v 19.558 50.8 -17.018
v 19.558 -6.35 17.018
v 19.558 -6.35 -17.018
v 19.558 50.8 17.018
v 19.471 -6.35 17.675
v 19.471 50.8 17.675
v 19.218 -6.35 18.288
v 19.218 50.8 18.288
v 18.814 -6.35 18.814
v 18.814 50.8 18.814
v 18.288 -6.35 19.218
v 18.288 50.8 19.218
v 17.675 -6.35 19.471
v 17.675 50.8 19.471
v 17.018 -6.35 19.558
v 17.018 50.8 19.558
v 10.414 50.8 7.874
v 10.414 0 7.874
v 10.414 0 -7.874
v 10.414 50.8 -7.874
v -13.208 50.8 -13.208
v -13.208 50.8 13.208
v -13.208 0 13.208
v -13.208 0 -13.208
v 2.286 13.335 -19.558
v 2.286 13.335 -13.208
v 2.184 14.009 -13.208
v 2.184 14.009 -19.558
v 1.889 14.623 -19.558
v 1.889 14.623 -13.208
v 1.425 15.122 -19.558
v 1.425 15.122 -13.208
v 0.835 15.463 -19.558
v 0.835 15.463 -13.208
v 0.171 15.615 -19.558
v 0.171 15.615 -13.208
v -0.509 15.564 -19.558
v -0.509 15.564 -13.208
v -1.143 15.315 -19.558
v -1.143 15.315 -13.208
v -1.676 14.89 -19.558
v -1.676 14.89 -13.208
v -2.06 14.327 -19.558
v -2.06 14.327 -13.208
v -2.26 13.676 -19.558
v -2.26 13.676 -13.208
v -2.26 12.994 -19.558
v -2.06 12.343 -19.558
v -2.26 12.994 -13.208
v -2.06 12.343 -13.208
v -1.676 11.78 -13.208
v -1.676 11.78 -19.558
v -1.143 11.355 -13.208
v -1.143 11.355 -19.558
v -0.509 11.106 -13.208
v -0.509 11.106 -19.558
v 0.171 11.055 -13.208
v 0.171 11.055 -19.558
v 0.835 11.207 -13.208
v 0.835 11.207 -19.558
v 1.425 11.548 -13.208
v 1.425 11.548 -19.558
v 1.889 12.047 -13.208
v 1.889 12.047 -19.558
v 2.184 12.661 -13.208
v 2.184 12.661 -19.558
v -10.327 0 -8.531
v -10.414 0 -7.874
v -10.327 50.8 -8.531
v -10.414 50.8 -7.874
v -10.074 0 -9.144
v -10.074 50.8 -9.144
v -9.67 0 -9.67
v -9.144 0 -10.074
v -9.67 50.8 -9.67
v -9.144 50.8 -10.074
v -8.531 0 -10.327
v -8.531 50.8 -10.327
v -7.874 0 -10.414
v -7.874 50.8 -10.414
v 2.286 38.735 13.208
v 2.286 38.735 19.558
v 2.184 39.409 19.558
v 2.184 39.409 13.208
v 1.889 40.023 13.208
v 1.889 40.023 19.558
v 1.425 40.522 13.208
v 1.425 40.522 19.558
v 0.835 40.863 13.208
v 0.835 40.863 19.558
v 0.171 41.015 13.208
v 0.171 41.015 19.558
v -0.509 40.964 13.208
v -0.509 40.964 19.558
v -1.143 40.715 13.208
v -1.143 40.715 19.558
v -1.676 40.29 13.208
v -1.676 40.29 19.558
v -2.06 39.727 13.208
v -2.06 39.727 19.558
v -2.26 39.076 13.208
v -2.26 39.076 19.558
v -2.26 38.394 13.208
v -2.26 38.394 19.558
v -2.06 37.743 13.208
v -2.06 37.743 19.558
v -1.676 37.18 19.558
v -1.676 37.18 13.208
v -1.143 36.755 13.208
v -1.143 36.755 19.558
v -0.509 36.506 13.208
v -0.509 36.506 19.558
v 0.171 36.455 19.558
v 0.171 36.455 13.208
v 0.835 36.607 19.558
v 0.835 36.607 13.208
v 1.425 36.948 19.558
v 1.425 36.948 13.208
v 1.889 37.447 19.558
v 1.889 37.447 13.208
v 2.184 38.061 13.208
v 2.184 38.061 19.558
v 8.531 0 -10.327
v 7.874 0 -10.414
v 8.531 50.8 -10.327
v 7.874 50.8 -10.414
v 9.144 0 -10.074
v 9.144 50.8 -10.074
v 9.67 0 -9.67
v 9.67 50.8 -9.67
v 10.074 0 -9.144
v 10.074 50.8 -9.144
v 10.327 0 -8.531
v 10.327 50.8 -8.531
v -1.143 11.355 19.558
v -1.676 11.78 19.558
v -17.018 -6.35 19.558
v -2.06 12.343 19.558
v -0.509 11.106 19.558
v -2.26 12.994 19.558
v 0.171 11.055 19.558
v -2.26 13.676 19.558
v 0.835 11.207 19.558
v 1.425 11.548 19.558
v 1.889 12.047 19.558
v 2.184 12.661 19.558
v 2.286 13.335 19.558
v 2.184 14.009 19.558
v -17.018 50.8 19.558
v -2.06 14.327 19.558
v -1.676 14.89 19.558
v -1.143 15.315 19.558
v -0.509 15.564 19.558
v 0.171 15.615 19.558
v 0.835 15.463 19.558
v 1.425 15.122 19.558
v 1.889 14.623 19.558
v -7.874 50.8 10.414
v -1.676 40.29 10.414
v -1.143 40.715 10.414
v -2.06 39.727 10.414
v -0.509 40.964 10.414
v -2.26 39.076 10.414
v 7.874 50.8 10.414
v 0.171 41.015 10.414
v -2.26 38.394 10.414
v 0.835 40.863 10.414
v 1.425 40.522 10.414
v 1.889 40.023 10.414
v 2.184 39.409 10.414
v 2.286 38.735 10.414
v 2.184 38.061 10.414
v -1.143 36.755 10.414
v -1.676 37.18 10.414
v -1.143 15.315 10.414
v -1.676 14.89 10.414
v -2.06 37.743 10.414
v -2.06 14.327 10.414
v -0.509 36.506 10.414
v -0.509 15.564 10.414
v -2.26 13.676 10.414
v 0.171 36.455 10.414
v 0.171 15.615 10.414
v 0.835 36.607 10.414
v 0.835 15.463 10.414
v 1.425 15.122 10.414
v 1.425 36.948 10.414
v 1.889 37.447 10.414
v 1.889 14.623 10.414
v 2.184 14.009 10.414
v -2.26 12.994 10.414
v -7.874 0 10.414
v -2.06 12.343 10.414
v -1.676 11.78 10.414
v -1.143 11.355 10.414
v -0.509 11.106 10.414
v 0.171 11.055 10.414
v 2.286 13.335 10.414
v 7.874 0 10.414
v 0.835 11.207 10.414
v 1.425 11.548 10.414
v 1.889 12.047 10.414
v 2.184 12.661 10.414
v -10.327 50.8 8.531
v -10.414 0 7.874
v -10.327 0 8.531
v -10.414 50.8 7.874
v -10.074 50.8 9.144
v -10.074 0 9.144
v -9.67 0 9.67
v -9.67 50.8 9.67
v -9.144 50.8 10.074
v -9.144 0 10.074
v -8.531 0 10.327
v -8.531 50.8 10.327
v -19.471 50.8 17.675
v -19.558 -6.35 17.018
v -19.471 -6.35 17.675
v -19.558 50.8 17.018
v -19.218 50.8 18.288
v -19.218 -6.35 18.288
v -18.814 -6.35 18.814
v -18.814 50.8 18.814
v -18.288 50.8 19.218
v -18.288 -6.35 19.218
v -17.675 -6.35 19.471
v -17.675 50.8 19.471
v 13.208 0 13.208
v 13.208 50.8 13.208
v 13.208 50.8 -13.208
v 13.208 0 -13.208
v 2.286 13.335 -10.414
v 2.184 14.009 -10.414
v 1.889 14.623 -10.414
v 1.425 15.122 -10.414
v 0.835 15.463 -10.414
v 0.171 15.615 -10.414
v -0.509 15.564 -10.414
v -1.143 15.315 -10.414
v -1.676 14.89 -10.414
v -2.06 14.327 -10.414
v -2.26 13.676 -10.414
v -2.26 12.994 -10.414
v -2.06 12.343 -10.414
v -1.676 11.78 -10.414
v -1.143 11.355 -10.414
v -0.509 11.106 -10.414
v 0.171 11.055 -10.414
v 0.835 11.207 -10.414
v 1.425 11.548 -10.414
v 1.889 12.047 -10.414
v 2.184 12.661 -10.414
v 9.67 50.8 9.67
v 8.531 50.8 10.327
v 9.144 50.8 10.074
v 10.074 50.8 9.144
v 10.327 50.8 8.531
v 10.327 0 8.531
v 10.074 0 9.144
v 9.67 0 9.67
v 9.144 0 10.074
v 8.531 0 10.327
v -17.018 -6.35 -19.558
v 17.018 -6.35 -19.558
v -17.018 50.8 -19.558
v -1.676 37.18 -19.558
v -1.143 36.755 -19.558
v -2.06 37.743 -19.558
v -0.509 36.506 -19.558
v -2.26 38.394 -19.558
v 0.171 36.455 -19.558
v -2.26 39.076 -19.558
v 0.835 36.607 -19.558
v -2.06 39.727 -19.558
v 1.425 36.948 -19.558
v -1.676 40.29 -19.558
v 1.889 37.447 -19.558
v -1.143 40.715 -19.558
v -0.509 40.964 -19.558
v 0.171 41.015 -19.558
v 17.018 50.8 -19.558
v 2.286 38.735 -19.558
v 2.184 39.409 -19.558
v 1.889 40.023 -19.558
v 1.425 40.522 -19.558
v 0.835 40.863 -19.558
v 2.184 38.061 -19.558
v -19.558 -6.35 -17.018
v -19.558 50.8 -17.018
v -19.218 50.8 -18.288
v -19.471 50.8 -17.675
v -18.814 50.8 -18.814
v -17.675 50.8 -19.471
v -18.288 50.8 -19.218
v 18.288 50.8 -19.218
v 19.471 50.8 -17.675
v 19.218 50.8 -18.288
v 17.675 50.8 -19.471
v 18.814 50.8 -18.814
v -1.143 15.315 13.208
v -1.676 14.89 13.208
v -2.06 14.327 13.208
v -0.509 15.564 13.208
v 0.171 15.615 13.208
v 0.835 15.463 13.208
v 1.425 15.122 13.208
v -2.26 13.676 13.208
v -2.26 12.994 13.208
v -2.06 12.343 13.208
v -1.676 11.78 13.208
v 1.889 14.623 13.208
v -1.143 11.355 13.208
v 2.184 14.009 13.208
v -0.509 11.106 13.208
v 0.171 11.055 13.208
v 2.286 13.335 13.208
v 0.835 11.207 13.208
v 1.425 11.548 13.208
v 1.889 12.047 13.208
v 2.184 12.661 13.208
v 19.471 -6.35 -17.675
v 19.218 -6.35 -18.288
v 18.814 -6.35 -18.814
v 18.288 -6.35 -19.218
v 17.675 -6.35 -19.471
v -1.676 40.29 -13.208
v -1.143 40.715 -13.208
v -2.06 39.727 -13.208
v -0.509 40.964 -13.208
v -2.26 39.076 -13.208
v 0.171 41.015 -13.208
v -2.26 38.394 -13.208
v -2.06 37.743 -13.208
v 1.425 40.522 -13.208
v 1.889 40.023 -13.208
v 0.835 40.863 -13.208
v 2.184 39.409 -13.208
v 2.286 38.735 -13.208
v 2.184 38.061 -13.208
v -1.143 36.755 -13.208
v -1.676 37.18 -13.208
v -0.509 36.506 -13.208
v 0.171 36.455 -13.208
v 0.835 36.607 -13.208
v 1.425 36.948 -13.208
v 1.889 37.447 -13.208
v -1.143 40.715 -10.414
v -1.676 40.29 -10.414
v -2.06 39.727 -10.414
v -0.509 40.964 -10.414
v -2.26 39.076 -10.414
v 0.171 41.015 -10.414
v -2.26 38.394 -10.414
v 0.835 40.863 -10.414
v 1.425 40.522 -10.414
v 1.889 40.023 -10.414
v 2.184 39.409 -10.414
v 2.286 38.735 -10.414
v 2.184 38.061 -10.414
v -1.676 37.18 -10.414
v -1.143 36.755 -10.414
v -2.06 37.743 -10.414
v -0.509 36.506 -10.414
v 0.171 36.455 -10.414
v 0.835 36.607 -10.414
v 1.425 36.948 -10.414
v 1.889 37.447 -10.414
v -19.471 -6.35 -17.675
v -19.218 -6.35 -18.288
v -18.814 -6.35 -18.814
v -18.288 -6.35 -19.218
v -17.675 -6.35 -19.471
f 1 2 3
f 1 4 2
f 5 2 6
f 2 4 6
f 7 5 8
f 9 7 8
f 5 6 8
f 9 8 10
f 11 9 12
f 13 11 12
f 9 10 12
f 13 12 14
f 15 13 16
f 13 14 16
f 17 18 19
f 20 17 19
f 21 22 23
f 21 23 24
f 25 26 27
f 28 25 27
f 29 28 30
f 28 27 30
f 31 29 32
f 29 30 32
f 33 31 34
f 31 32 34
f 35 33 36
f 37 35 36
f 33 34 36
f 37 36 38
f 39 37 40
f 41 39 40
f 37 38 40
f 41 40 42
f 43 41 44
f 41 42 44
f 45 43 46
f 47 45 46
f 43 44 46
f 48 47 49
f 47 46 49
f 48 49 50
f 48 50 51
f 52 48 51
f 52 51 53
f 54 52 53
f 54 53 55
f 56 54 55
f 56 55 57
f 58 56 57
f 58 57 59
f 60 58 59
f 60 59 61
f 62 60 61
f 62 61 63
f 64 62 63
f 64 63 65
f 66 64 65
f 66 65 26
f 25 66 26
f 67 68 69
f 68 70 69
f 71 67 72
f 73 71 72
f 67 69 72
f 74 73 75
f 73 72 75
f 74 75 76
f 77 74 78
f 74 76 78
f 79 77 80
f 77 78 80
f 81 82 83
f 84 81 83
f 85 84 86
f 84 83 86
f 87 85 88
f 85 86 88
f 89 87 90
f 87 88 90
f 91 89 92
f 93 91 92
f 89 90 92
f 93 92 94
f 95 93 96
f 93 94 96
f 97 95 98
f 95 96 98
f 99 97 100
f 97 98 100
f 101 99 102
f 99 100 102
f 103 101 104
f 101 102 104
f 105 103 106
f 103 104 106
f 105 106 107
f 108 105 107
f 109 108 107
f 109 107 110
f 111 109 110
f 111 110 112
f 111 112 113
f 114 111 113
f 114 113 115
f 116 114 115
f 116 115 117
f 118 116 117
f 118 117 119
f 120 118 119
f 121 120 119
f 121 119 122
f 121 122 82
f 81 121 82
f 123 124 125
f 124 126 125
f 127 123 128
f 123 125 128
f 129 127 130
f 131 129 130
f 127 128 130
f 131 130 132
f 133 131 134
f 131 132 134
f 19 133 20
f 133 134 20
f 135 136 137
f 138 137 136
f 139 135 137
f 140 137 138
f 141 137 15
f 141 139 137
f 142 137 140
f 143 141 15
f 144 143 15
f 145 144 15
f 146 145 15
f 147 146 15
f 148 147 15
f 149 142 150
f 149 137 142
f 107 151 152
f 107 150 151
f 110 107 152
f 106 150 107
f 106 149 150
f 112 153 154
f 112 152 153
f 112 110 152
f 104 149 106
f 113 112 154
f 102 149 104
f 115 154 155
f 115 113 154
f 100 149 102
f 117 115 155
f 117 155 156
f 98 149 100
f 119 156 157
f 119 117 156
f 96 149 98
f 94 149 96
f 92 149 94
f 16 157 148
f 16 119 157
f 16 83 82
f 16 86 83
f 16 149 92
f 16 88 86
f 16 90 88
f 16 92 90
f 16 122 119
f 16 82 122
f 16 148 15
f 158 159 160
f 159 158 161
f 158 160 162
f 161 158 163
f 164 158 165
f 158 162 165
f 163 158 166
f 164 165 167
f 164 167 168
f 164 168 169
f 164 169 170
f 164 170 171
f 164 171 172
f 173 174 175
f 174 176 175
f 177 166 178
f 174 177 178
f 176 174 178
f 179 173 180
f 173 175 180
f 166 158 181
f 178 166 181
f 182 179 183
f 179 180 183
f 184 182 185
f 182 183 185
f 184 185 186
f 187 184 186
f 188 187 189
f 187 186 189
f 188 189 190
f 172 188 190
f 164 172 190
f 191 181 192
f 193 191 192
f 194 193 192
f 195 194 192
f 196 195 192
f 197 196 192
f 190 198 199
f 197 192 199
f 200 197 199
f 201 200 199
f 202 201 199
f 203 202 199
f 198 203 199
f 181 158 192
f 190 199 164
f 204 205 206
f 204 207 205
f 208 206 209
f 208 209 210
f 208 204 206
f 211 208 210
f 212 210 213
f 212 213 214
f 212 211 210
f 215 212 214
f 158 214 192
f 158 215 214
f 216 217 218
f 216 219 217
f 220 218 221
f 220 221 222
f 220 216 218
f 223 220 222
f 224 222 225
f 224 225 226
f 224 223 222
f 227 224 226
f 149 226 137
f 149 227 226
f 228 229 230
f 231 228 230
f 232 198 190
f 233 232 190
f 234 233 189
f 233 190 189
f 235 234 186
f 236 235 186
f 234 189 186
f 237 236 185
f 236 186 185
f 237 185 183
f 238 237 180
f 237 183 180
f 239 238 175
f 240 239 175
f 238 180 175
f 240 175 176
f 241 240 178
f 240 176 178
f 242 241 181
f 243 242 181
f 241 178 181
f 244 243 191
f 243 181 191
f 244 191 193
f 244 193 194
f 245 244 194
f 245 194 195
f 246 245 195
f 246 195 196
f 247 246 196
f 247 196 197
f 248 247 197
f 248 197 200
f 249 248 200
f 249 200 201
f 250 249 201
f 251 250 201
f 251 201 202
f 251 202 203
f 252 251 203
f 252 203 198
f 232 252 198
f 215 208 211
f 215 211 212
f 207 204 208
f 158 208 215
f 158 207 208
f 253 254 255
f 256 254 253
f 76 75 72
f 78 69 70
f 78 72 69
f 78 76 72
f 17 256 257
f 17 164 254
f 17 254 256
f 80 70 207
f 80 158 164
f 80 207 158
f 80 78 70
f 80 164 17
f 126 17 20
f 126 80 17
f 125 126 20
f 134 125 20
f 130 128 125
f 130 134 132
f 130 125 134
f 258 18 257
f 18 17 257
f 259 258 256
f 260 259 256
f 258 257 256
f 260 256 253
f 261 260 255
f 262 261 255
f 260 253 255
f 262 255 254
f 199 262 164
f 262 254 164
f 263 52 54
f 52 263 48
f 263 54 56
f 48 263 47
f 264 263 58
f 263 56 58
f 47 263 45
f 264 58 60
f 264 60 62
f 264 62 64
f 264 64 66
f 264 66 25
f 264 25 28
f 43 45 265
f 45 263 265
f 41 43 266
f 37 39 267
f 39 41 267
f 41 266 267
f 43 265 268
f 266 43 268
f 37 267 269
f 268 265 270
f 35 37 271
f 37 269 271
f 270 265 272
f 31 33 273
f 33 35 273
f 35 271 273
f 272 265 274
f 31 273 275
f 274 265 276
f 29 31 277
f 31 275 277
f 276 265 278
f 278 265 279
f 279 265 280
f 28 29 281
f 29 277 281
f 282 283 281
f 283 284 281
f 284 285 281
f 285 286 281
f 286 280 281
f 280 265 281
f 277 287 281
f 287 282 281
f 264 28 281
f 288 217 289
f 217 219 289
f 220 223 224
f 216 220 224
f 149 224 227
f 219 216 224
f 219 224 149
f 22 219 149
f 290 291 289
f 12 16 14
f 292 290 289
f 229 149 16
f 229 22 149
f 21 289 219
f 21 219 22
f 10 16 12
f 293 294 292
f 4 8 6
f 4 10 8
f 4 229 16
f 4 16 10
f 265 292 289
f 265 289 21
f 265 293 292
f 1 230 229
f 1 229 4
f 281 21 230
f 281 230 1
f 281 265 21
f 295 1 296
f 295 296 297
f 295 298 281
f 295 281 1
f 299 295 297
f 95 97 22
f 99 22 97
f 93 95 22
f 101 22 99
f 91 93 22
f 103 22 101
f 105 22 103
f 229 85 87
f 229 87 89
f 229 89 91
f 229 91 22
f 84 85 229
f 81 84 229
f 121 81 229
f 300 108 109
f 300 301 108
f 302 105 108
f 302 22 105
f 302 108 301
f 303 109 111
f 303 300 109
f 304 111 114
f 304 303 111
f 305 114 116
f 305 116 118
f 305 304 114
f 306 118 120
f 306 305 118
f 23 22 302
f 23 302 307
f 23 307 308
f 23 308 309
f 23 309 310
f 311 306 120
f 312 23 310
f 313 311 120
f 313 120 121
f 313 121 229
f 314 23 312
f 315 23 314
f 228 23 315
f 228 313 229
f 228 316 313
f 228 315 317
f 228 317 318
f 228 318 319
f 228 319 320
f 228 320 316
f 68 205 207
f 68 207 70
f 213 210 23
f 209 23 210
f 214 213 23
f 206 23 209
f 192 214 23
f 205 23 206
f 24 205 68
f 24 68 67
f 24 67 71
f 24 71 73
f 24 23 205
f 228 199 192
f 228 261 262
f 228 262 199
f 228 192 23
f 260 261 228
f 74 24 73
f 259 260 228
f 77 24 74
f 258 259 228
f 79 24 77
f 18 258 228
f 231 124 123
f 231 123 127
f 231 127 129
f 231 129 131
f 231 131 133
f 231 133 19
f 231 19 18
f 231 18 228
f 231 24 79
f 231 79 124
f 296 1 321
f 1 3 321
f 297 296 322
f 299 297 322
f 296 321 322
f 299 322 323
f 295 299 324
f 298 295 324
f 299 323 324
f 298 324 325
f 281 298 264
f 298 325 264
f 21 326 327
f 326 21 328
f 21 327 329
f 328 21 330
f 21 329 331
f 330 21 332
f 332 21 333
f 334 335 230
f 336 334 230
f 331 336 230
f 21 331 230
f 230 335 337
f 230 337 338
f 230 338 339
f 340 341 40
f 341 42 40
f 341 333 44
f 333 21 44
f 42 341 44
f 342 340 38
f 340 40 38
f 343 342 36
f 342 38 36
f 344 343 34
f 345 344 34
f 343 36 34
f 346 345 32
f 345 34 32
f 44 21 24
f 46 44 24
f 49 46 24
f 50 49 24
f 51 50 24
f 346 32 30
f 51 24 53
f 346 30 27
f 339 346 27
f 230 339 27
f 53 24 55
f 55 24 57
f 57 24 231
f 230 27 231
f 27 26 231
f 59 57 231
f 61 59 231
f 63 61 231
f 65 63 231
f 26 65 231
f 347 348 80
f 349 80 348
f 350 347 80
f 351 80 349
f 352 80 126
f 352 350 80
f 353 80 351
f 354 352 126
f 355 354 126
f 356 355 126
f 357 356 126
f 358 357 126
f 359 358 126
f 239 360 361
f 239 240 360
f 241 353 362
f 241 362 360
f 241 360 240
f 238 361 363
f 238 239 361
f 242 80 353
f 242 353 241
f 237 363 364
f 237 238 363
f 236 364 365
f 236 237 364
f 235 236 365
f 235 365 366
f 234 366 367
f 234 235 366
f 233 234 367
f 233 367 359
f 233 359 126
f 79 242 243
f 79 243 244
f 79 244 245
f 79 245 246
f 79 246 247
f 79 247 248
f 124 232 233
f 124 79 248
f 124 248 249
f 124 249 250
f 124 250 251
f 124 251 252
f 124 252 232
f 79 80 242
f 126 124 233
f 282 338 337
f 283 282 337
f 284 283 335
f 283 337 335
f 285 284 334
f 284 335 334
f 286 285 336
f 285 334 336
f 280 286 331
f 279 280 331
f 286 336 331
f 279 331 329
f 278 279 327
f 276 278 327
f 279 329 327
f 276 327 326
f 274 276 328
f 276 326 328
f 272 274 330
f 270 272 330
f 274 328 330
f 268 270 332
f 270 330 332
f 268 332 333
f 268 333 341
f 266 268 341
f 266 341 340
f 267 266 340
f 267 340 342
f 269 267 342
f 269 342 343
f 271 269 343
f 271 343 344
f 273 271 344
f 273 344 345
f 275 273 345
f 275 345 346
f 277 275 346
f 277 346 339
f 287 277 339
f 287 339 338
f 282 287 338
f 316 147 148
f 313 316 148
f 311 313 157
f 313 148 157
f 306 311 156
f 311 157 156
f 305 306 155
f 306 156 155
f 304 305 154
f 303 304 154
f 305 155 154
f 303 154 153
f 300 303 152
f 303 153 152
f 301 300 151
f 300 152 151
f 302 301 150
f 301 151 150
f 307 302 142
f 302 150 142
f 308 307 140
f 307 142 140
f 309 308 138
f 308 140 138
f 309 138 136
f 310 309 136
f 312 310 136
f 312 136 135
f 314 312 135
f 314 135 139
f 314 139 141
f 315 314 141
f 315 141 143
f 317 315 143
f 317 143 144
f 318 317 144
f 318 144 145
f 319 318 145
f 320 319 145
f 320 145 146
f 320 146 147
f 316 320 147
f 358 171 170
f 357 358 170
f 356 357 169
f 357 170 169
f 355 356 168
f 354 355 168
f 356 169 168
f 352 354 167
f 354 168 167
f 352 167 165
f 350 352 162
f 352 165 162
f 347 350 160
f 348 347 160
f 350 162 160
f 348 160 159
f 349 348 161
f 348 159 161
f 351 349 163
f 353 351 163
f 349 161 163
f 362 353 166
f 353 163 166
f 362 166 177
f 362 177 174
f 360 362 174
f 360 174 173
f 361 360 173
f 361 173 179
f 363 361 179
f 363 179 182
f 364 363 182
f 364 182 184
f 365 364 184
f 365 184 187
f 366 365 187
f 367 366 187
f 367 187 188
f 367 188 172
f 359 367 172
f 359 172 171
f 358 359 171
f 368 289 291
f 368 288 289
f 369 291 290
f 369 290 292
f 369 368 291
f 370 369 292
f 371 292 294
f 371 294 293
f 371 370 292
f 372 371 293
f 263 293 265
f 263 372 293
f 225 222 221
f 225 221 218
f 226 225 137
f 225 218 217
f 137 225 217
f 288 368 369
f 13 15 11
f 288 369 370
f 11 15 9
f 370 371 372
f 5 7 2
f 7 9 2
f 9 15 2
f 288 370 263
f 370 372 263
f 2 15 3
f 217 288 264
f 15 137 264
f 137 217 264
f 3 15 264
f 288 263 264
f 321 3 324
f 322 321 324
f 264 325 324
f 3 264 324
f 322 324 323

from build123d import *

# Parameters (mm, degrees)
SKETCH1_W             = 39.116
SKETCH1_H             = 39.116
SKETCH1_W_2           = 26.416
SKETCH1_H_2           = 26.416
BOSS_EXTRUDE1_DEPTH   = 50.8
SKETCH1_W_3           = 20.828
SKETCH1_H_3           = 20.828
BOSS_EXTRUDE1_2_DEPTH = 50.8
SKETCH2_R             = 2.286
CUT_EXTRUDE1_DEPTH    = 68.031461419
SKETCH1_2_W           = 39.116
SKETCH1_2_H           = 39.116
BOSS_EXTRUDE2_DEPTH   = 6.35
FILLET1_R             = 2.54


with BuildPart() as part:
    # Sketch1 → Boss-Extrude1 (new body)
    with BuildSketch(Plane(origin=(0, 0, 0), x_dir=(1, 0, 0), z_dir=(0, 1, 0))):
        Rectangle(SKETCH1_W, SKETCH1_H)
        Rectangle(SKETCH1_W_2, SKETCH1_H_2, mode=Mode.SUBTRACT)
    extrude(amount=BOSS_EXTRUDE1_DEPTH)


with BuildPart() as body_2:
    # Sketch1 → Boss-Extrude1 2 (new body)
    with BuildSketch(Plane(origin=(0, 0, 0), x_dir=(1, 0, 0), z_dir=(0, 1, 0))):
        Rectangle(SKETCH1_W_3, SKETCH1_H_3)
    extrude(amount=BOSS_EXTRUDE1_2_DEPTH)


with BuildPart() as cut_extrude1_tool:
    # Sketch2 → Cut-Extrude1 (new, through all)
    with BuildSketch(Plane.XY.offset(19.558)):
        with Locations((0, 13.335)):
            Circle(SKETCH2_R)
        with Locations((0, 38.735)):
            Circle(SKETCH2_R)
    extrude(amount=-CUT_EXTRUDE1_DEPTH)


with BuildPart() as part_1:
    add(part.part)

    # Cut-Extrude1: cut by cut_extrude1_tool
    add(cut_extrude1_tool.part, mode=Mode.SUBTRACT)



with BuildPart() as body_2_1:
    add(body_2.part)

    # Cut-Extrude1: cut by cut_extrude1_tool
    add(cut_extrude1_tool.part, mode=Mode.SUBTRACT)


with BuildPart() as part_2:
    add(part_1.part)

    add(body_2_1.part)  # Boss-Extrude2 merges body 2
    # Sketch1<2> → Boss-Extrude2 (add)
    with BuildSketch(Plane(origin=(0, 0, 0), x_dir=(1, 0, 0), z_dir=(0, 1, 0))):
        Rectangle(SKETCH1_2_W, SKETCH1_2_H)
    extrude(amount=-BOSS_EXTRUDE2_DEPTH)

    # Fillet1
    fillet1_edges = [part_2.edges().sort_by_distance(p)[0] for p in [
        (19.558, 22.225, -19.558),
        (-19.558, 22.225, -19.558),
        (19.558, 22.225, 19.558),
        (-19.558, 22.225, 19.558),
        (10.414, 25.4, -10.414),
        (-10.414, 25.4, 10.414),
        (10.414, 25.4, 10.414),
        (-10.414, 25.4, -10.414),
    ]]
    fillet(fillet1_edges, radius=FILLET1_R)


solid = part_2.part
